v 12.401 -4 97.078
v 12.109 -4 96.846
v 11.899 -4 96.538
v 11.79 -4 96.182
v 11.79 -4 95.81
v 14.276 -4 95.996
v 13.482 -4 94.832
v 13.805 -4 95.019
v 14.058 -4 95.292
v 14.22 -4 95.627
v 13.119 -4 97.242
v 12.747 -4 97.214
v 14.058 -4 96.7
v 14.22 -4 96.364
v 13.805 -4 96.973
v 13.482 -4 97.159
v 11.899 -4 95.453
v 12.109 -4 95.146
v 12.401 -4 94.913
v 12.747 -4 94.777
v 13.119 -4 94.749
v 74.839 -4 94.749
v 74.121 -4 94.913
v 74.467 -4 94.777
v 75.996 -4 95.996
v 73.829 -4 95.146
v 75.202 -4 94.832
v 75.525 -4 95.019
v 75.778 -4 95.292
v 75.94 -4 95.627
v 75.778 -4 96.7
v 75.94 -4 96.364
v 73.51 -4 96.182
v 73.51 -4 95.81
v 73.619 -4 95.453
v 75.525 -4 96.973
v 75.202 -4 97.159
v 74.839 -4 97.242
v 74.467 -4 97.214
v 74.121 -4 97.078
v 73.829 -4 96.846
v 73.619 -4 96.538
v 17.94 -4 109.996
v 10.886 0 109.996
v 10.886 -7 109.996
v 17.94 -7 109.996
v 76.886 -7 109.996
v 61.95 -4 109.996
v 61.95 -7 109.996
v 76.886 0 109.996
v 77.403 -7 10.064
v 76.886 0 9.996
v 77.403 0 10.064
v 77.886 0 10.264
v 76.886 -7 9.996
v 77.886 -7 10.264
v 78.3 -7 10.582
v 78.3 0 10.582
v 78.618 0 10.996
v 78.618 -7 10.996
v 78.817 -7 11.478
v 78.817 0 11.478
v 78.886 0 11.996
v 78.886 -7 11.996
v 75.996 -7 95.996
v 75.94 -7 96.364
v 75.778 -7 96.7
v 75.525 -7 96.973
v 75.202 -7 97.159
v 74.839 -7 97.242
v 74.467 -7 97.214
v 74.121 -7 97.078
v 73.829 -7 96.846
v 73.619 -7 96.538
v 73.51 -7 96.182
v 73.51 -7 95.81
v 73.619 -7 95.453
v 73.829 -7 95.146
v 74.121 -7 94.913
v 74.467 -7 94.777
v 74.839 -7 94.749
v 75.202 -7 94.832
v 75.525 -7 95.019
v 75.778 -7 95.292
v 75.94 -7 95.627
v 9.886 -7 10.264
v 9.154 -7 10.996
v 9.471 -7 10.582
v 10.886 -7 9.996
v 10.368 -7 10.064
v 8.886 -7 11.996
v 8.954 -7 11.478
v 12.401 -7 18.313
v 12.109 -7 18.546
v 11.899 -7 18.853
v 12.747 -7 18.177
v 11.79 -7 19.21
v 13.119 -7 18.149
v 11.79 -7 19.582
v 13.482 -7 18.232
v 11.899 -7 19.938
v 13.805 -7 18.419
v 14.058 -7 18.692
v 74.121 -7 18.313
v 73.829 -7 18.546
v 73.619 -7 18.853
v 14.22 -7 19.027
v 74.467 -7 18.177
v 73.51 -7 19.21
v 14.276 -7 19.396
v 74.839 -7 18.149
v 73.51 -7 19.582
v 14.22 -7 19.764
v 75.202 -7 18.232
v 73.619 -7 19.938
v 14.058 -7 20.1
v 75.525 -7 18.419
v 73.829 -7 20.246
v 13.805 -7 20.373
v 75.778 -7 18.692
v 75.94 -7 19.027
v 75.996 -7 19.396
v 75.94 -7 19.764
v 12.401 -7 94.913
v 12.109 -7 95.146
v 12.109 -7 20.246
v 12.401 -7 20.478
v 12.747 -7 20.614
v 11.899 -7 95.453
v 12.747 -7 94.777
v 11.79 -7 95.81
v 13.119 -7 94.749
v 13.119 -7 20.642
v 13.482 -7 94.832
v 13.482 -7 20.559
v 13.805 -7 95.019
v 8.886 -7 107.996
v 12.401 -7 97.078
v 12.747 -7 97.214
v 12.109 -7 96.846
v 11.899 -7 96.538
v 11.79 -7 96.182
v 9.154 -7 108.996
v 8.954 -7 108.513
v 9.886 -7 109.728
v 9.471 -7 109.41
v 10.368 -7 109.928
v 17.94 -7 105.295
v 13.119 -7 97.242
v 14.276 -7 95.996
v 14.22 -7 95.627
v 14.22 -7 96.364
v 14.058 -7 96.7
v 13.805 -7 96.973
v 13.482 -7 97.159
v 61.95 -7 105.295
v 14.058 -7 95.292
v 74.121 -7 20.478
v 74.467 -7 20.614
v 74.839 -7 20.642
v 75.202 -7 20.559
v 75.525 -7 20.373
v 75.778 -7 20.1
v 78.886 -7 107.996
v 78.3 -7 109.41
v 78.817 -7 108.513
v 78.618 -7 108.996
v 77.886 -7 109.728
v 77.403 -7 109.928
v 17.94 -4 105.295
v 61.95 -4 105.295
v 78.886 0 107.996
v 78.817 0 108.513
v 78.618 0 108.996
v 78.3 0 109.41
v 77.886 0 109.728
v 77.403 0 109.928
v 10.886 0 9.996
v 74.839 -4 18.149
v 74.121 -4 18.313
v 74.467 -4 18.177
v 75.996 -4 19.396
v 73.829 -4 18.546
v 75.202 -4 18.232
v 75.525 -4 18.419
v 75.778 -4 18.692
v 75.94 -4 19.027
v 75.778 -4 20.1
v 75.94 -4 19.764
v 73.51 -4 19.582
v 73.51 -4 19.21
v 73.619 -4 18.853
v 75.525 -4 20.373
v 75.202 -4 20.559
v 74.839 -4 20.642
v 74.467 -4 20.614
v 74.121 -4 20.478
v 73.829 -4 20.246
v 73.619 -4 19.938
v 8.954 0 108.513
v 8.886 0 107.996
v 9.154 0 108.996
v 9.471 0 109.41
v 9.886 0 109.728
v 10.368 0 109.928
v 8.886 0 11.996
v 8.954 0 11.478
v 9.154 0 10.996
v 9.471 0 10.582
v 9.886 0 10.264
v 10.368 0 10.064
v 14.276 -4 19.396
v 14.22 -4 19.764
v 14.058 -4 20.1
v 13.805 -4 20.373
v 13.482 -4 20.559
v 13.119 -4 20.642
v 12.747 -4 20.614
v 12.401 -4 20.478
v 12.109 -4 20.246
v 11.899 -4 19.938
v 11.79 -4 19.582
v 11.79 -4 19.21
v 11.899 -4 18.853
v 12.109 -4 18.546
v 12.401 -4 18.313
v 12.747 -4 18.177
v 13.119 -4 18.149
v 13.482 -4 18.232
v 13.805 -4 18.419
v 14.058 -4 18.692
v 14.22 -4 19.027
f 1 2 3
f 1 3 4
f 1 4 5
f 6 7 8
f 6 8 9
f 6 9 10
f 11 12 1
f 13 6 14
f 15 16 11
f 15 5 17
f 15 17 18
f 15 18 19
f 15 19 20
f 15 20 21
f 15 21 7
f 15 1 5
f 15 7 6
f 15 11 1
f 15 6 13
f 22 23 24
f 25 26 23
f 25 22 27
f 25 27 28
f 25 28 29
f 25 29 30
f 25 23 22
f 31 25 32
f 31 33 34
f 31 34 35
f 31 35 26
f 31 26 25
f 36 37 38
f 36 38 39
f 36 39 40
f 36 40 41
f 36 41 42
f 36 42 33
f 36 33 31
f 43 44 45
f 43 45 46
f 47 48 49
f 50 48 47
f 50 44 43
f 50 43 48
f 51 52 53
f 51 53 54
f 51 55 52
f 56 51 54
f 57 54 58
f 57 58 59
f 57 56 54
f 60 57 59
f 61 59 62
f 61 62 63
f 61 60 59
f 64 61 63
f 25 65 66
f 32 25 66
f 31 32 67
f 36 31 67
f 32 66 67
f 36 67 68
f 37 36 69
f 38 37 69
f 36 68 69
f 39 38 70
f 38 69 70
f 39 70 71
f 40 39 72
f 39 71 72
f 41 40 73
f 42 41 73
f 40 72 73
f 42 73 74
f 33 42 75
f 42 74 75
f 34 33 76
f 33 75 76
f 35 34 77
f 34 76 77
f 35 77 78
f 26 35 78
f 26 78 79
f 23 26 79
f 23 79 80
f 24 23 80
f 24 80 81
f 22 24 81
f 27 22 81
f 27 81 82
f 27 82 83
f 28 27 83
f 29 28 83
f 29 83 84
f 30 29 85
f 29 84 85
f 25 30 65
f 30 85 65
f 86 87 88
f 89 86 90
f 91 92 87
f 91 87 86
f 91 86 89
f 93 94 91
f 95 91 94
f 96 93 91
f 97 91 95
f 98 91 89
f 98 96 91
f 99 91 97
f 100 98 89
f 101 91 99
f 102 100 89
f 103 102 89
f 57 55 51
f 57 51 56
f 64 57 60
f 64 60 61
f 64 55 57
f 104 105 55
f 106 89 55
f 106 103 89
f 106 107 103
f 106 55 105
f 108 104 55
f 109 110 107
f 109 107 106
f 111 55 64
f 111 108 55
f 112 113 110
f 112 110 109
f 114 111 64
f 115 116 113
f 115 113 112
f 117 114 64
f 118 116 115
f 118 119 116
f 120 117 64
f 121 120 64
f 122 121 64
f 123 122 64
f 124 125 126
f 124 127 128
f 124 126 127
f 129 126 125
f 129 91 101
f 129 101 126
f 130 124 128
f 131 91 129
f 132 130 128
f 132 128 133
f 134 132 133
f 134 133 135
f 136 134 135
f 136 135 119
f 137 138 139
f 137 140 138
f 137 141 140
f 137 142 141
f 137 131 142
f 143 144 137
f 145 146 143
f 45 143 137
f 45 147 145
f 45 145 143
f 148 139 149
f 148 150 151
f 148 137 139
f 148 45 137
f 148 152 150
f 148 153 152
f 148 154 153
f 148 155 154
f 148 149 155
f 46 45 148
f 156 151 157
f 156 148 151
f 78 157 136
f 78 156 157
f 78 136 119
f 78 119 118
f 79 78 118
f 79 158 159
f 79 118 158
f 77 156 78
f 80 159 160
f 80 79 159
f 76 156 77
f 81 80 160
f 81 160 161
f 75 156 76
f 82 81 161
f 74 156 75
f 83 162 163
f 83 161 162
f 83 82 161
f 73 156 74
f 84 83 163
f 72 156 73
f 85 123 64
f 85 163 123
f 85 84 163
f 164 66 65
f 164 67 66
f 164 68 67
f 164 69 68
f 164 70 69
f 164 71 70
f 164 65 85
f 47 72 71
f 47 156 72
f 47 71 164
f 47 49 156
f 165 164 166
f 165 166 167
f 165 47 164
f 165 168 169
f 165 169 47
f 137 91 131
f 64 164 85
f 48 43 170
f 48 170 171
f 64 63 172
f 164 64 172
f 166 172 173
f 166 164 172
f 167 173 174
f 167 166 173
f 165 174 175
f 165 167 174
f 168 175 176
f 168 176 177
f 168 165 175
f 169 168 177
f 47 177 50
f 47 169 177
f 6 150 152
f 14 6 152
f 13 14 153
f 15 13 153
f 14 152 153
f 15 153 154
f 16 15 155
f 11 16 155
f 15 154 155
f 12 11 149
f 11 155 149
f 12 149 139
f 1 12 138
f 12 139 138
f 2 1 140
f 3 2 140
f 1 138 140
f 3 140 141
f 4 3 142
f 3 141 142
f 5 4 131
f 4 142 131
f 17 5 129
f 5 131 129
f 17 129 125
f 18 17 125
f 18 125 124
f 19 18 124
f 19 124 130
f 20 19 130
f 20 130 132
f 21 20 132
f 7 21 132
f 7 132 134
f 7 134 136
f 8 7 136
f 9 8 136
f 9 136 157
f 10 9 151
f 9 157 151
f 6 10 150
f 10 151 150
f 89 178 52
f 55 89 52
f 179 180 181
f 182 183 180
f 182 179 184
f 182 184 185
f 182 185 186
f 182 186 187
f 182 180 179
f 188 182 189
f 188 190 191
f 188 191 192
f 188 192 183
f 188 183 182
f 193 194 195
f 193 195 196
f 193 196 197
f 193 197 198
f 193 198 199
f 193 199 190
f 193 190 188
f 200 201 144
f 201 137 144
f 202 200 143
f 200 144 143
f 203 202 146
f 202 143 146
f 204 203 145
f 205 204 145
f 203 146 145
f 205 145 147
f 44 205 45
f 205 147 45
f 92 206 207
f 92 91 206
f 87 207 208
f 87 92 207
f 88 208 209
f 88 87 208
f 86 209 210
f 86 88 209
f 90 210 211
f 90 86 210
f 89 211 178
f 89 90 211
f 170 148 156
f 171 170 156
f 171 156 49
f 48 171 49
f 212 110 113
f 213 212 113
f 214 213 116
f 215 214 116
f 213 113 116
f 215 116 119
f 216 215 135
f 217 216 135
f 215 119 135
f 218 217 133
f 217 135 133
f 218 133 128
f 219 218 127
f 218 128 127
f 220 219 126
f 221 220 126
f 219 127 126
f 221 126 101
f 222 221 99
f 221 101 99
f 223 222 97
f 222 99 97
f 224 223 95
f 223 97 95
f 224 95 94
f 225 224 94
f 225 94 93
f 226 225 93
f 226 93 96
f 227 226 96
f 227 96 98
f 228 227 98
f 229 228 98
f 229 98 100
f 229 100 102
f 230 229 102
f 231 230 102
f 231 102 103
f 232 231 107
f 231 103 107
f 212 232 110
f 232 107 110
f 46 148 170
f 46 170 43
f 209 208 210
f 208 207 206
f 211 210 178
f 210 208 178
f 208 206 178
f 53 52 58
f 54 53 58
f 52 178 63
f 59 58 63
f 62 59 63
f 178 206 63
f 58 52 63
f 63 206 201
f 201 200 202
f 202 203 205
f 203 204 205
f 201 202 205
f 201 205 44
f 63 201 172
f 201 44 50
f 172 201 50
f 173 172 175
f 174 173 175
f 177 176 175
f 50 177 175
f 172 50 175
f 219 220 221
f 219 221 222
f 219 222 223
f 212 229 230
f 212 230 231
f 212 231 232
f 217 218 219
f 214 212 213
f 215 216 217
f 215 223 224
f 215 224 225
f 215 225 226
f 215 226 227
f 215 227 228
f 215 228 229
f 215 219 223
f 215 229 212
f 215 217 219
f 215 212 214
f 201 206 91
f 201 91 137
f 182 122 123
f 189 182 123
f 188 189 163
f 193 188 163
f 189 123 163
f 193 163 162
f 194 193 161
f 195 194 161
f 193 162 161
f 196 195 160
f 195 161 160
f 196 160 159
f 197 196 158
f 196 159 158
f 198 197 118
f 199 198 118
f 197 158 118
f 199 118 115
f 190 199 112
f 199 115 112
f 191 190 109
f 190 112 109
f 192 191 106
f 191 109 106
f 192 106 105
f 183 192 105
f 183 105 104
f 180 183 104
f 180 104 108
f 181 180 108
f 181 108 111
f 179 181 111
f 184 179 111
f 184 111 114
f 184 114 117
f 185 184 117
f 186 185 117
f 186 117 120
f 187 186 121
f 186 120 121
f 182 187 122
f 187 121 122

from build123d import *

# Parameters (mm, degrees)
F0_W     = 70
F0_H     = 100
F1_DEPTH = 7
F2_R     = 2
F3_R     = 1.25
F3_W     = 44.0106242895
F3_H     = 4.7012990341
F4_DEPTH = 3


with BuildPart() as f1:
    # F0 (on Front) → F1 (new body)
    with BuildSketch(Plane.XZ):
        with Locations((43.885584152, 59.9958246574)):
            Rectangle(F0_W, F0_H)
    extrude(amount=F1_DEPTH)

    # F2
    f2_edges = [f1.edges().sort_by_distance(p)[0] for p in [
        (8.885584, -3.5, 109.995825),
        (8.885584, -3.5, 9.995825),
        (78.885584, -3.5, 9.995825),
        (78.885584, -3.5, 109.995825),
    ]]
    fillet(f2_edges, radius=F2_R)

    # F3 (on face) → F4 (cut)
    with BuildSketch(Plane.XZ.offset(7)):
        with Locations((13.025584152, 95.9958246574)):
            Circle(F3_R)
        with Locations((74.745584152, 95.9958246574)):
            Circle(F3_R)
        with Locations((13.025584152, 19.3958246574)):
            Circle(F3_R)
        with Locations((74.745584152, 19.3958246574)):
            Circle(F3_R)
        with Locations((39.9450175464, 107.6451751404)):
            Rectangle(F3_W, F3_H)
    extrude(amount=-F4_DEPTH, mode=Mode.SUBTRACT)


solid = f1.part
